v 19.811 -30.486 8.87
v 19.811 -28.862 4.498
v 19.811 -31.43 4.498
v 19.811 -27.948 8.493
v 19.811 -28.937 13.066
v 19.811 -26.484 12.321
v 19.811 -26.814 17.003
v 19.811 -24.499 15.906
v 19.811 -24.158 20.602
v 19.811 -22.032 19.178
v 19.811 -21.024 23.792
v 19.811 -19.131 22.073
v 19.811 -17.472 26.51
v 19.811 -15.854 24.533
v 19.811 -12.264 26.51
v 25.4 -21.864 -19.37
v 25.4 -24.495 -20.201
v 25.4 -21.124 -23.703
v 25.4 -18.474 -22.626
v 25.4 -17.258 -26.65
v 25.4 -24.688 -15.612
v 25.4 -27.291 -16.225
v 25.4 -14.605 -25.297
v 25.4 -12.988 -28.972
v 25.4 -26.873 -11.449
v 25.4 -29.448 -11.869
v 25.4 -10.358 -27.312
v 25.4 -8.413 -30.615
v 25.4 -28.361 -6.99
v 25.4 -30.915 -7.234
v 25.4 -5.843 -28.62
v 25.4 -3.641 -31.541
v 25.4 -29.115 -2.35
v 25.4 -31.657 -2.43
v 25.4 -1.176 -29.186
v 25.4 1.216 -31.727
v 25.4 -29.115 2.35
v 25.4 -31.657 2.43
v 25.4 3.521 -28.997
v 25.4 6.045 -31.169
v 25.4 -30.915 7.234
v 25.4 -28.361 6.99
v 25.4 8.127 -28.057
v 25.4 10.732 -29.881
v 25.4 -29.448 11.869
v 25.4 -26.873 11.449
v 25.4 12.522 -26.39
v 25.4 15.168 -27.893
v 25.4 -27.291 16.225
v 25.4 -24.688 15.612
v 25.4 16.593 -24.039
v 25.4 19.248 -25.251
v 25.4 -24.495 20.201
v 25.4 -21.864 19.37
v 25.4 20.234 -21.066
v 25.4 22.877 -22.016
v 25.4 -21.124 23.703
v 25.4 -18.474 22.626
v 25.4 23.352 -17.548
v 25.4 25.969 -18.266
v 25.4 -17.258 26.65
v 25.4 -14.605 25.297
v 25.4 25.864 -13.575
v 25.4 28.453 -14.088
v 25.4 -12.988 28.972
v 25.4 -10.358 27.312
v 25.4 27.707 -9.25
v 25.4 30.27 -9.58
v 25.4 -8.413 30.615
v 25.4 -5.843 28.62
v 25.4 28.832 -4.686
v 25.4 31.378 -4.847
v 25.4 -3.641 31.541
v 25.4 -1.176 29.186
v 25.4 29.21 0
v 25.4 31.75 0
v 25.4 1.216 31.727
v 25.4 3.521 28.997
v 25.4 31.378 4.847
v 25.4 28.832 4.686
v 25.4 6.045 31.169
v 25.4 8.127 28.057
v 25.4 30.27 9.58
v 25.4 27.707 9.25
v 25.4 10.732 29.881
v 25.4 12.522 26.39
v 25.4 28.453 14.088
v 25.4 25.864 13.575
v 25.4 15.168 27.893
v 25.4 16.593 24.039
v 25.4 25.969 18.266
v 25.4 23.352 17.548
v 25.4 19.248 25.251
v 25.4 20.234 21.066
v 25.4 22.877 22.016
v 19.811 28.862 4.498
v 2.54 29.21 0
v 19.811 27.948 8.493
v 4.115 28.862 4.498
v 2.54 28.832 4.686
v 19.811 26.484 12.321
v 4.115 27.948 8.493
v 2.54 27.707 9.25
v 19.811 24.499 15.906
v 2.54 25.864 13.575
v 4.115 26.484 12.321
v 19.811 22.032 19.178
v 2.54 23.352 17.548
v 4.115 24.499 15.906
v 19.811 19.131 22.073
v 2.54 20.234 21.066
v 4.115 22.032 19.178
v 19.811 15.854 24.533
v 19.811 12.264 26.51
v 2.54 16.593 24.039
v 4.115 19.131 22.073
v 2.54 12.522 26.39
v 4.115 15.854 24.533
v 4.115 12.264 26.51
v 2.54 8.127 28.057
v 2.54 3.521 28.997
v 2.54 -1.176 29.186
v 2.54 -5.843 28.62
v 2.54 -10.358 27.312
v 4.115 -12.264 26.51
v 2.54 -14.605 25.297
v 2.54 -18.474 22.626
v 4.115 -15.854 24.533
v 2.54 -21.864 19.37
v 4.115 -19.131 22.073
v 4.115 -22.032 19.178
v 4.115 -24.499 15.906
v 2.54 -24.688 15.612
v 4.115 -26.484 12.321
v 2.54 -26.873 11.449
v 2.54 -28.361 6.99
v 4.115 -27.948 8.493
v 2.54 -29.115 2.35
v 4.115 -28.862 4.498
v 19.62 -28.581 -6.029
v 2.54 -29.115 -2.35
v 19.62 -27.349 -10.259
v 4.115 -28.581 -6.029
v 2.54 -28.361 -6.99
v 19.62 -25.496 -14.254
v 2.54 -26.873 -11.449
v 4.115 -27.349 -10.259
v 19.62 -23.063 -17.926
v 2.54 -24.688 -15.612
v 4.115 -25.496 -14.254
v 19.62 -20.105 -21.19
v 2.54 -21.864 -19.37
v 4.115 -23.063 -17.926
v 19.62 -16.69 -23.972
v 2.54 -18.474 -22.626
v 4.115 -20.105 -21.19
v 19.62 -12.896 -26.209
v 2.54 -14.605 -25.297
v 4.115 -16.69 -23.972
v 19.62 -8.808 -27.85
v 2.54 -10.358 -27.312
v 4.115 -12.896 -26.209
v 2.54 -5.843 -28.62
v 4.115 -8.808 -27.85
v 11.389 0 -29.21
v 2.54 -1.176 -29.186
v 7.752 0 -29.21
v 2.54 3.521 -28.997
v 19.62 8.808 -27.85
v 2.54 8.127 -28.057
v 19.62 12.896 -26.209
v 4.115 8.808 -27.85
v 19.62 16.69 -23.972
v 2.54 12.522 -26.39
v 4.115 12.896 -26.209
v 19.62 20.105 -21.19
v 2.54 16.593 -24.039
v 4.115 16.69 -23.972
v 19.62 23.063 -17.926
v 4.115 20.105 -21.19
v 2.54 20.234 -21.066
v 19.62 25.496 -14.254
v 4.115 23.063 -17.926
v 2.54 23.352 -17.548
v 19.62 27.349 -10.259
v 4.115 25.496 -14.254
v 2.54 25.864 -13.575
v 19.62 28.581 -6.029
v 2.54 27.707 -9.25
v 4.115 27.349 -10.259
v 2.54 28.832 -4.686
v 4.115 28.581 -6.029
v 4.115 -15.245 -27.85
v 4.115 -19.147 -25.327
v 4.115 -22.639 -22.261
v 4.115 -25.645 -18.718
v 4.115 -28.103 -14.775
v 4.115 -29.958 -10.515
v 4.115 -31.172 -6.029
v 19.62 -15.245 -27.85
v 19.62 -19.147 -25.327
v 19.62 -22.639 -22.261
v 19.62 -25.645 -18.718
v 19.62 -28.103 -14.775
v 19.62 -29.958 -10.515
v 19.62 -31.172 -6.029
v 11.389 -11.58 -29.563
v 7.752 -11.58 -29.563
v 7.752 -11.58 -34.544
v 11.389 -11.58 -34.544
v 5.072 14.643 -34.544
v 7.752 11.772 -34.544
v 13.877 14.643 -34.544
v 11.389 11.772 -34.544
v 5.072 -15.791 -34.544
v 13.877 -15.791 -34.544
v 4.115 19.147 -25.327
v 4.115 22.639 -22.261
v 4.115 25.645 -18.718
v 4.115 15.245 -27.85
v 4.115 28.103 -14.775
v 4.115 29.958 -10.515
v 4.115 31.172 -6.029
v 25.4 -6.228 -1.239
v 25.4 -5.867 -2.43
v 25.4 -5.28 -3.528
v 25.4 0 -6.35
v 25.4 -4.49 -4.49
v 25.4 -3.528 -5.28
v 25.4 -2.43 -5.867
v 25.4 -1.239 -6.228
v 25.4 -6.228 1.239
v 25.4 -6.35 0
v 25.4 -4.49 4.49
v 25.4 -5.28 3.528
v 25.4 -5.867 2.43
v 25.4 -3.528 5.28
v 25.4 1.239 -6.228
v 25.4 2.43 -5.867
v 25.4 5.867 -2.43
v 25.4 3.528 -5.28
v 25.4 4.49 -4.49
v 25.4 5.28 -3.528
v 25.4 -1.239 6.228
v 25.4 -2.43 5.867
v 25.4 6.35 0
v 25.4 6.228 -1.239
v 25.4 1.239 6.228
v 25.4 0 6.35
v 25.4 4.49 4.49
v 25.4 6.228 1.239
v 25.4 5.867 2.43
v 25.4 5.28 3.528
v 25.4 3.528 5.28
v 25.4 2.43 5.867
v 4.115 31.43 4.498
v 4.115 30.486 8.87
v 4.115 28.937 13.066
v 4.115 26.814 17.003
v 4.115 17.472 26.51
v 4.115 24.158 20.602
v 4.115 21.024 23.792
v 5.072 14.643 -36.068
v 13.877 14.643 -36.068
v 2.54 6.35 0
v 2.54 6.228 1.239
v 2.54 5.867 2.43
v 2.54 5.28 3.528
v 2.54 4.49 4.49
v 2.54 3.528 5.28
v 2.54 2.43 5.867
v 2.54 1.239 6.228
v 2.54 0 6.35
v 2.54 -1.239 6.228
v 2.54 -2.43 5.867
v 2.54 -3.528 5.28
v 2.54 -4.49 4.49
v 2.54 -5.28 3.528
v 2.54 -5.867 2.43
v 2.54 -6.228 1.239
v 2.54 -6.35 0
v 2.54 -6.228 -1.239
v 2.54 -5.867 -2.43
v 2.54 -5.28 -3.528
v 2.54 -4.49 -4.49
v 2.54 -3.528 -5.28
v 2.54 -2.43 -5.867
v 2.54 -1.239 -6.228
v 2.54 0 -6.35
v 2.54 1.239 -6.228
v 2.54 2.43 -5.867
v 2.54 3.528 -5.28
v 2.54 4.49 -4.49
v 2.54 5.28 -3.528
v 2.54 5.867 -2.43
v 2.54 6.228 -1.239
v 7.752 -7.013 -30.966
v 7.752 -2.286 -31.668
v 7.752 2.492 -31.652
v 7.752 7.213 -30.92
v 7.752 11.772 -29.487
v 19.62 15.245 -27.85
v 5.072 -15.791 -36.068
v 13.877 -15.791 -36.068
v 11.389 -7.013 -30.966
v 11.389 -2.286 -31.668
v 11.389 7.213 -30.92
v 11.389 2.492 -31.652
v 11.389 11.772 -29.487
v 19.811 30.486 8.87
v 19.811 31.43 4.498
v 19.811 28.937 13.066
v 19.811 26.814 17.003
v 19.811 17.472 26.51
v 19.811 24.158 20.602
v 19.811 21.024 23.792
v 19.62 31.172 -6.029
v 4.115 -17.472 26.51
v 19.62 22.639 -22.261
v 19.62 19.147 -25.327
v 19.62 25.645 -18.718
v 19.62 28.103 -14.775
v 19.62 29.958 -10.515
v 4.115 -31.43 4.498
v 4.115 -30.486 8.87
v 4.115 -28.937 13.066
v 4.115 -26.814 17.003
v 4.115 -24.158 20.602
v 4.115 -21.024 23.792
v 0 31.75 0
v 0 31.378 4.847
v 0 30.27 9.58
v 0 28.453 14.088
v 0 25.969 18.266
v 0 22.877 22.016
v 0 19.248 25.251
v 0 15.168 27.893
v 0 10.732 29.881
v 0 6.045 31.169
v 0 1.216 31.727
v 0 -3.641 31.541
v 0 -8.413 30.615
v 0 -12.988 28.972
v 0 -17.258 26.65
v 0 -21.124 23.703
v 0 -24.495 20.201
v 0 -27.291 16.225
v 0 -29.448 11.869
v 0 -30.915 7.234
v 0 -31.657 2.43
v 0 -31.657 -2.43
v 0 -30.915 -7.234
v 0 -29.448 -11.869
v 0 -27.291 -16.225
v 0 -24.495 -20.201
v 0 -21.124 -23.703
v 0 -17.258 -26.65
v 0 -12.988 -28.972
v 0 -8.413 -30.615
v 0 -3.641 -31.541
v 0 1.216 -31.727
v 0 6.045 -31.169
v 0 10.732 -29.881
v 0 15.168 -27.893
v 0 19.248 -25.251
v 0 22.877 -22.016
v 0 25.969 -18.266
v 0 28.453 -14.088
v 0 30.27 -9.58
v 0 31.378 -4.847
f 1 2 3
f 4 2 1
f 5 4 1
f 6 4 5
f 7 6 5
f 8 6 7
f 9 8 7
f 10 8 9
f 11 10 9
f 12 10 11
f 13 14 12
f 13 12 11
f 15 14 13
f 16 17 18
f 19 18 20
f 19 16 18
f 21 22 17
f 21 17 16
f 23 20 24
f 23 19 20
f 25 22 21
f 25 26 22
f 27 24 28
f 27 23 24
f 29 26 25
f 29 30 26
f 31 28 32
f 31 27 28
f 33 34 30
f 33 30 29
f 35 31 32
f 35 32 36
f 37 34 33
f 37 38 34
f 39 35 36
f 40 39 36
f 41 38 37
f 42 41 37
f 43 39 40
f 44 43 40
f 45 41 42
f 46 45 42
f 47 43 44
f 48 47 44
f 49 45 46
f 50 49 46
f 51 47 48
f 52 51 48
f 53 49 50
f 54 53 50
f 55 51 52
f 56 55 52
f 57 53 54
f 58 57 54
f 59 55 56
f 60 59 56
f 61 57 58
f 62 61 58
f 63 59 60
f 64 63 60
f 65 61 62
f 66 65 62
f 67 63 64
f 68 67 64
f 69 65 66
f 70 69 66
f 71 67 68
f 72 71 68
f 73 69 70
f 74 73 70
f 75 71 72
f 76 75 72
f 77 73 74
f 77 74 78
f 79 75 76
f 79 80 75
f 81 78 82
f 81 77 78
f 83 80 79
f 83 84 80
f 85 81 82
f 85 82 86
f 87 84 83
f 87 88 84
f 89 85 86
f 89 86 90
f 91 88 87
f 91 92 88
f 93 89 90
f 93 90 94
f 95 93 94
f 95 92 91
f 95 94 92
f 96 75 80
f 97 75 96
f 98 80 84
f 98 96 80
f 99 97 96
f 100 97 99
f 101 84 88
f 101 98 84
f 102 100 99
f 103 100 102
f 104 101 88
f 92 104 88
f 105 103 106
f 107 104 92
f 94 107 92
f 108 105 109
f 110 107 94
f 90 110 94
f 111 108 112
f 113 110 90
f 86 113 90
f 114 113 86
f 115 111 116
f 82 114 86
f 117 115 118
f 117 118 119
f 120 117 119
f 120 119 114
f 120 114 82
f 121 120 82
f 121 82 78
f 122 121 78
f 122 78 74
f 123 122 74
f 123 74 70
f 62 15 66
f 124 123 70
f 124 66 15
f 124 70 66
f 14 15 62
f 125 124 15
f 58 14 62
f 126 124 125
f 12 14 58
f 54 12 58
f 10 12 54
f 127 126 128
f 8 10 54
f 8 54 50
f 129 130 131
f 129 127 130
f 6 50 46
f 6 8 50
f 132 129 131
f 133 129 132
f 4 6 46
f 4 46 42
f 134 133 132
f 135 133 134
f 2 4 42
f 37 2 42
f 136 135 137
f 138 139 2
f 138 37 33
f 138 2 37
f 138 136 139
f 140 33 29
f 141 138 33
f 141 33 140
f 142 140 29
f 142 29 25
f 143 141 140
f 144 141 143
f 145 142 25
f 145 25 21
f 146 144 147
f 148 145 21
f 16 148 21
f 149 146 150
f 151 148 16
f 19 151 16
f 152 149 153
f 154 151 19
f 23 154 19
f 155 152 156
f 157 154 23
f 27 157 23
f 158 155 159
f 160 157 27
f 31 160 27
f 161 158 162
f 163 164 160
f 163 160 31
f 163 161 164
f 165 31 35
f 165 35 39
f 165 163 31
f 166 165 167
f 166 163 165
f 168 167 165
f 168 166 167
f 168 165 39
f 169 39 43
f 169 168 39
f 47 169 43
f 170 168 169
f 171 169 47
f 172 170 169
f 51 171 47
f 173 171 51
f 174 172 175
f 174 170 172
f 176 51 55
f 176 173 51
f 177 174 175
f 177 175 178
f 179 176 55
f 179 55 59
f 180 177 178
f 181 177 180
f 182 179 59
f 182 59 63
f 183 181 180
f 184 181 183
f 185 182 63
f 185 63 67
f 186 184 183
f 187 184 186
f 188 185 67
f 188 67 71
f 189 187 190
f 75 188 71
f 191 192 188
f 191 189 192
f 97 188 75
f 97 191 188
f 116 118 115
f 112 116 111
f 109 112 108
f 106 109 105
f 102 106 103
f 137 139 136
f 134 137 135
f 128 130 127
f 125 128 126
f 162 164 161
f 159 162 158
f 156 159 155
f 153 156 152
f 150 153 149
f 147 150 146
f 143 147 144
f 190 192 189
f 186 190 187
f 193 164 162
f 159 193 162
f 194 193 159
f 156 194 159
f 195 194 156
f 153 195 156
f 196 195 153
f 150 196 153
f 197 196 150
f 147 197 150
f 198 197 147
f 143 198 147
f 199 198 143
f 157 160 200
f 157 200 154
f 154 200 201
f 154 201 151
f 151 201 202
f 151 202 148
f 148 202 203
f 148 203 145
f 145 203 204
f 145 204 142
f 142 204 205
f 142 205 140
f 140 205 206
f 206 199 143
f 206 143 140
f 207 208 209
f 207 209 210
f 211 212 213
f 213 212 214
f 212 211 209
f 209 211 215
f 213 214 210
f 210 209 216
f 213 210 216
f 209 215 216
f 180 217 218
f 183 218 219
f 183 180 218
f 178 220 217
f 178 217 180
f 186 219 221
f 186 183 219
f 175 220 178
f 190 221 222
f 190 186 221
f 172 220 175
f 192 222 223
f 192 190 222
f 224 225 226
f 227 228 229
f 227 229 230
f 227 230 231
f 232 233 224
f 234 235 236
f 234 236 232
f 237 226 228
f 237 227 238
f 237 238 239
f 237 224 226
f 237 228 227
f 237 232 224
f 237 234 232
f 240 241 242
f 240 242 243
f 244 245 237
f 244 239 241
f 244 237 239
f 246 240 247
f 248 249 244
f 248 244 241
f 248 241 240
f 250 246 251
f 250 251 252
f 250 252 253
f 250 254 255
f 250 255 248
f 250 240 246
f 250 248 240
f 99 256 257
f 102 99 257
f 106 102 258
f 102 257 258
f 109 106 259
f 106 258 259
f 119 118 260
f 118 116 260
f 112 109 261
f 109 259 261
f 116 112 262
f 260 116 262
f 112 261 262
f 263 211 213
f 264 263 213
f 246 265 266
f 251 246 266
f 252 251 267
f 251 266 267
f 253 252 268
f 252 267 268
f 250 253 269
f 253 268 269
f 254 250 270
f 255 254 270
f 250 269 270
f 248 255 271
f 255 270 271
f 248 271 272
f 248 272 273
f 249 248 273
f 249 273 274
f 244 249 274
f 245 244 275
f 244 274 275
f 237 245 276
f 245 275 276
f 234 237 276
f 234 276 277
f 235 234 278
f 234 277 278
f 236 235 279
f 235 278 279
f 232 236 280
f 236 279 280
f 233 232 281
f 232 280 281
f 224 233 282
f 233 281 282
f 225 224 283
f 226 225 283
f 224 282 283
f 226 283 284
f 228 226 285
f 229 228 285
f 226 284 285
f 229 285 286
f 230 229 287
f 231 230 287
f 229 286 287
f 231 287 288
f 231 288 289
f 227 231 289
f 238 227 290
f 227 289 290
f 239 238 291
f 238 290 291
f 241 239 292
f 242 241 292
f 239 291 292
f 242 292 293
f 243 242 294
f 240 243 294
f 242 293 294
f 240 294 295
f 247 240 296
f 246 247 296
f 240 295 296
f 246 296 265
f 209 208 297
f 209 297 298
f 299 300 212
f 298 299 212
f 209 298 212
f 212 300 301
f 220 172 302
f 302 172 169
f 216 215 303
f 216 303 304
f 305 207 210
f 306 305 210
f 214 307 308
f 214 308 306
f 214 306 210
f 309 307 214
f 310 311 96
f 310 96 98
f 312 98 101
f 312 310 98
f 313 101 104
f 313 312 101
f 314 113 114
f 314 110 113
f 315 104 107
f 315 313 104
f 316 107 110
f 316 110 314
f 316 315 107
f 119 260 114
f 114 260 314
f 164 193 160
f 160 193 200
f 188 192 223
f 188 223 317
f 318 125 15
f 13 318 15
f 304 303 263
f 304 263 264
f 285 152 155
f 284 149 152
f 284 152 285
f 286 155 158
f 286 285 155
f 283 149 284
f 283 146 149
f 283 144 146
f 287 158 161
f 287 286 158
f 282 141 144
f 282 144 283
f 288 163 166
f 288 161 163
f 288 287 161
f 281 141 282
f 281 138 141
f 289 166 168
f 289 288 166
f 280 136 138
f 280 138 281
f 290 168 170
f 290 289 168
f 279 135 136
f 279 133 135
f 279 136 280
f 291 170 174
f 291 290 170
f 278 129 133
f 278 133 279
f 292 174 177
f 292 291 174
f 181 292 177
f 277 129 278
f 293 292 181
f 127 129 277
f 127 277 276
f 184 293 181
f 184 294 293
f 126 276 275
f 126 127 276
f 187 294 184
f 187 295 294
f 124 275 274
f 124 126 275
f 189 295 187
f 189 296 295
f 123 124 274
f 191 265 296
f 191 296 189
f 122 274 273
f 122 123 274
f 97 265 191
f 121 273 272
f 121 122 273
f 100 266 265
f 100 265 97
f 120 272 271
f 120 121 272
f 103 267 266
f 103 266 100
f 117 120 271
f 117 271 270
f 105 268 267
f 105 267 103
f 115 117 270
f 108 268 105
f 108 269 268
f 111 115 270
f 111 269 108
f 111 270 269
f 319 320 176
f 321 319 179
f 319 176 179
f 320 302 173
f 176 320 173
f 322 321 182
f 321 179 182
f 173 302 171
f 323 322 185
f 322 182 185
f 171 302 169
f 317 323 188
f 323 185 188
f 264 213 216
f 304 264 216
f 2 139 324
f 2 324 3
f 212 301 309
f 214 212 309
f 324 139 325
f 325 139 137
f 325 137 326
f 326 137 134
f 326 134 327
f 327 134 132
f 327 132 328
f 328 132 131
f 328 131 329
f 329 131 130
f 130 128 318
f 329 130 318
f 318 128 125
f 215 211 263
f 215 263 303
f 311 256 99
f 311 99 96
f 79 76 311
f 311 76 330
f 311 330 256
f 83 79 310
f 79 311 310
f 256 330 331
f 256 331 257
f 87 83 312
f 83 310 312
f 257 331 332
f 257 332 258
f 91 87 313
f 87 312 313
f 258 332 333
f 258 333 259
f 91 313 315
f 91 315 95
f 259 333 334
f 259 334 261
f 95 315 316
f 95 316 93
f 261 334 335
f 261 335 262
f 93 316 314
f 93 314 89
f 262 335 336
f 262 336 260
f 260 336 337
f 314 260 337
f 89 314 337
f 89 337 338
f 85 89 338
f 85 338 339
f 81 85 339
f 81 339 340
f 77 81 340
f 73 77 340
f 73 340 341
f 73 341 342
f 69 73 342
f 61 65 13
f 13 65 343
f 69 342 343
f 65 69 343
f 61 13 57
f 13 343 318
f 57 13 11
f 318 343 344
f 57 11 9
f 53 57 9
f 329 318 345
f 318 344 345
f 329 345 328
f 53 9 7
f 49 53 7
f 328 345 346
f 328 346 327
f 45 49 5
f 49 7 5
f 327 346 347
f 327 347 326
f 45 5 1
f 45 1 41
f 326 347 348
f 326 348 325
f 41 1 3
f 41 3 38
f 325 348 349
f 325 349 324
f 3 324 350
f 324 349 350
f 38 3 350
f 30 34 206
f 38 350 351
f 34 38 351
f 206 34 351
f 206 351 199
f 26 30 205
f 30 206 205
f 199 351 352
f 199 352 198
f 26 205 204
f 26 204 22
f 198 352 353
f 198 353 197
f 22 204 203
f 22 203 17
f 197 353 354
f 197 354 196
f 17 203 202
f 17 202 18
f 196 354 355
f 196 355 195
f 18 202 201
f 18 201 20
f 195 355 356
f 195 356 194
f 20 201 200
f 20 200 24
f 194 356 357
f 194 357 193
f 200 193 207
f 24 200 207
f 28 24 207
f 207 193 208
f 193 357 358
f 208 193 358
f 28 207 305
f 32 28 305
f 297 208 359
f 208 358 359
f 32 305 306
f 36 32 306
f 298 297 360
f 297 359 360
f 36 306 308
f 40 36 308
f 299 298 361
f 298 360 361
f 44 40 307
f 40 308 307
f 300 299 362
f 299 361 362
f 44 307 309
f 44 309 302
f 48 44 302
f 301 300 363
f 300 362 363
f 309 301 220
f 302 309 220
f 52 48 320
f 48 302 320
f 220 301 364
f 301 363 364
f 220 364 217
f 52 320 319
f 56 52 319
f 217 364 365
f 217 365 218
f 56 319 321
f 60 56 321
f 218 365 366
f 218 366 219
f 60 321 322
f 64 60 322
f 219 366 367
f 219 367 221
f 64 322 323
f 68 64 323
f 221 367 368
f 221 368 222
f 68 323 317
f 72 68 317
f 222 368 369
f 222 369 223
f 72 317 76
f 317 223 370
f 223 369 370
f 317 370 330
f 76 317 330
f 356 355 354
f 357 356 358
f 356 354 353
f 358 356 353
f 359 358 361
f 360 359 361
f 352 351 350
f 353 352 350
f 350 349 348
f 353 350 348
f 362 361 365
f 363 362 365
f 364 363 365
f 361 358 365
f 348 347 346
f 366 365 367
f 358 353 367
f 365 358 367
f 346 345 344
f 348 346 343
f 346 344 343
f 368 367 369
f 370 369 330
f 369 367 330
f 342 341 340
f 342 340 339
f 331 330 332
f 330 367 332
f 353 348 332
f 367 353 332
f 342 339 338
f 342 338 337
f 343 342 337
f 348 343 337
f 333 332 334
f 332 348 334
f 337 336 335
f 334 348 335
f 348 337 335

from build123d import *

# Parameters (mm, degrees)
F0_R      = 31.75
F1_DEPTH  = 25.4
F2_T      = -2.54
F3_W      = 15.6957409345
F3_H      = 22.0123222098
F3_W_2    = 15.504329931
F3_H_2    = 21.820908878
F4_DEPTH  = 58.166
F6_W      = 3.6368169822
F6_H      = 23.3522010967
F7_DEPTH  = 5.334
F8_W      = 8.804930374
F8_H      = 30.4344259202
F8_W_2    = 3.6368169822
F8_H_2    = 23.3522010967
F9_DEPTH  = 1.524
F10_R     = 6.35
F11_DEPTH = 22.86


with BuildPart() as f1:
    # F0 (on Right) → F1 (new body)
    with BuildSketch(Plane.YZ):
        Circle(F0_R)
    extrude(amount=F1_DEPTH)

    # F2
    f2_openings = [f1.faces().sort_by_distance(p)[0] for p in [
        (25.4, 0, 0),
    ]]
    offset(amount=F2_T, openings=f2_openings)

    # F3 (on Front) → F4 (cut, symmetric)
    with BuildSketch(Plane.XZ):
        with Locations((11.9632177521, 15.5043308623)):
            Rectangle(F3_W, F3_H)
        with Locations((11.8675122503, -16.9399164151)):
            Rectangle(F3_W_2, F3_H_2)
    extrude(amount=F4_DEPTH, both=True, mode=Mode.SUBTRACT)

    # F6 (on offset) → F7 (join)
    with BuildSketch(Plane.XY.offset(-29.21)):
        with Locations((9.5705741551, 0.0957059674)):
            Rectangle(F6_W, F6_H)
    extrude(amount=-F7_DEPTH)

    # F8 (on face) → F9 (join)
    with BuildSketch(Plane(origin=(0, 0, -34.544), x_dir=(1, 0, 0), z_dir=(0, 0, -1))):
        with Locations((9.4748688862, 0.5742348731)):
            Rectangle(F8_W, F8_H)
        with Locations((9.5705741551, -0.0957059674)):
            Rectangle(F8_W_2, F8_H_2, mode=Mode.SUBTRACT)
        with Locations((9.5705741551, -0.0957059674)):
            Rectangle(F8_W_2, F8_H_2)
    extrude(amount=F9_DEPTH)

    # F10 (on face) → F11 (join)
    with BuildSketch(Plane.YZ.offset(2.54)):
        Circle(F10_R)
    extrude(amount=F11_DEPTH)


solid = f1.part
